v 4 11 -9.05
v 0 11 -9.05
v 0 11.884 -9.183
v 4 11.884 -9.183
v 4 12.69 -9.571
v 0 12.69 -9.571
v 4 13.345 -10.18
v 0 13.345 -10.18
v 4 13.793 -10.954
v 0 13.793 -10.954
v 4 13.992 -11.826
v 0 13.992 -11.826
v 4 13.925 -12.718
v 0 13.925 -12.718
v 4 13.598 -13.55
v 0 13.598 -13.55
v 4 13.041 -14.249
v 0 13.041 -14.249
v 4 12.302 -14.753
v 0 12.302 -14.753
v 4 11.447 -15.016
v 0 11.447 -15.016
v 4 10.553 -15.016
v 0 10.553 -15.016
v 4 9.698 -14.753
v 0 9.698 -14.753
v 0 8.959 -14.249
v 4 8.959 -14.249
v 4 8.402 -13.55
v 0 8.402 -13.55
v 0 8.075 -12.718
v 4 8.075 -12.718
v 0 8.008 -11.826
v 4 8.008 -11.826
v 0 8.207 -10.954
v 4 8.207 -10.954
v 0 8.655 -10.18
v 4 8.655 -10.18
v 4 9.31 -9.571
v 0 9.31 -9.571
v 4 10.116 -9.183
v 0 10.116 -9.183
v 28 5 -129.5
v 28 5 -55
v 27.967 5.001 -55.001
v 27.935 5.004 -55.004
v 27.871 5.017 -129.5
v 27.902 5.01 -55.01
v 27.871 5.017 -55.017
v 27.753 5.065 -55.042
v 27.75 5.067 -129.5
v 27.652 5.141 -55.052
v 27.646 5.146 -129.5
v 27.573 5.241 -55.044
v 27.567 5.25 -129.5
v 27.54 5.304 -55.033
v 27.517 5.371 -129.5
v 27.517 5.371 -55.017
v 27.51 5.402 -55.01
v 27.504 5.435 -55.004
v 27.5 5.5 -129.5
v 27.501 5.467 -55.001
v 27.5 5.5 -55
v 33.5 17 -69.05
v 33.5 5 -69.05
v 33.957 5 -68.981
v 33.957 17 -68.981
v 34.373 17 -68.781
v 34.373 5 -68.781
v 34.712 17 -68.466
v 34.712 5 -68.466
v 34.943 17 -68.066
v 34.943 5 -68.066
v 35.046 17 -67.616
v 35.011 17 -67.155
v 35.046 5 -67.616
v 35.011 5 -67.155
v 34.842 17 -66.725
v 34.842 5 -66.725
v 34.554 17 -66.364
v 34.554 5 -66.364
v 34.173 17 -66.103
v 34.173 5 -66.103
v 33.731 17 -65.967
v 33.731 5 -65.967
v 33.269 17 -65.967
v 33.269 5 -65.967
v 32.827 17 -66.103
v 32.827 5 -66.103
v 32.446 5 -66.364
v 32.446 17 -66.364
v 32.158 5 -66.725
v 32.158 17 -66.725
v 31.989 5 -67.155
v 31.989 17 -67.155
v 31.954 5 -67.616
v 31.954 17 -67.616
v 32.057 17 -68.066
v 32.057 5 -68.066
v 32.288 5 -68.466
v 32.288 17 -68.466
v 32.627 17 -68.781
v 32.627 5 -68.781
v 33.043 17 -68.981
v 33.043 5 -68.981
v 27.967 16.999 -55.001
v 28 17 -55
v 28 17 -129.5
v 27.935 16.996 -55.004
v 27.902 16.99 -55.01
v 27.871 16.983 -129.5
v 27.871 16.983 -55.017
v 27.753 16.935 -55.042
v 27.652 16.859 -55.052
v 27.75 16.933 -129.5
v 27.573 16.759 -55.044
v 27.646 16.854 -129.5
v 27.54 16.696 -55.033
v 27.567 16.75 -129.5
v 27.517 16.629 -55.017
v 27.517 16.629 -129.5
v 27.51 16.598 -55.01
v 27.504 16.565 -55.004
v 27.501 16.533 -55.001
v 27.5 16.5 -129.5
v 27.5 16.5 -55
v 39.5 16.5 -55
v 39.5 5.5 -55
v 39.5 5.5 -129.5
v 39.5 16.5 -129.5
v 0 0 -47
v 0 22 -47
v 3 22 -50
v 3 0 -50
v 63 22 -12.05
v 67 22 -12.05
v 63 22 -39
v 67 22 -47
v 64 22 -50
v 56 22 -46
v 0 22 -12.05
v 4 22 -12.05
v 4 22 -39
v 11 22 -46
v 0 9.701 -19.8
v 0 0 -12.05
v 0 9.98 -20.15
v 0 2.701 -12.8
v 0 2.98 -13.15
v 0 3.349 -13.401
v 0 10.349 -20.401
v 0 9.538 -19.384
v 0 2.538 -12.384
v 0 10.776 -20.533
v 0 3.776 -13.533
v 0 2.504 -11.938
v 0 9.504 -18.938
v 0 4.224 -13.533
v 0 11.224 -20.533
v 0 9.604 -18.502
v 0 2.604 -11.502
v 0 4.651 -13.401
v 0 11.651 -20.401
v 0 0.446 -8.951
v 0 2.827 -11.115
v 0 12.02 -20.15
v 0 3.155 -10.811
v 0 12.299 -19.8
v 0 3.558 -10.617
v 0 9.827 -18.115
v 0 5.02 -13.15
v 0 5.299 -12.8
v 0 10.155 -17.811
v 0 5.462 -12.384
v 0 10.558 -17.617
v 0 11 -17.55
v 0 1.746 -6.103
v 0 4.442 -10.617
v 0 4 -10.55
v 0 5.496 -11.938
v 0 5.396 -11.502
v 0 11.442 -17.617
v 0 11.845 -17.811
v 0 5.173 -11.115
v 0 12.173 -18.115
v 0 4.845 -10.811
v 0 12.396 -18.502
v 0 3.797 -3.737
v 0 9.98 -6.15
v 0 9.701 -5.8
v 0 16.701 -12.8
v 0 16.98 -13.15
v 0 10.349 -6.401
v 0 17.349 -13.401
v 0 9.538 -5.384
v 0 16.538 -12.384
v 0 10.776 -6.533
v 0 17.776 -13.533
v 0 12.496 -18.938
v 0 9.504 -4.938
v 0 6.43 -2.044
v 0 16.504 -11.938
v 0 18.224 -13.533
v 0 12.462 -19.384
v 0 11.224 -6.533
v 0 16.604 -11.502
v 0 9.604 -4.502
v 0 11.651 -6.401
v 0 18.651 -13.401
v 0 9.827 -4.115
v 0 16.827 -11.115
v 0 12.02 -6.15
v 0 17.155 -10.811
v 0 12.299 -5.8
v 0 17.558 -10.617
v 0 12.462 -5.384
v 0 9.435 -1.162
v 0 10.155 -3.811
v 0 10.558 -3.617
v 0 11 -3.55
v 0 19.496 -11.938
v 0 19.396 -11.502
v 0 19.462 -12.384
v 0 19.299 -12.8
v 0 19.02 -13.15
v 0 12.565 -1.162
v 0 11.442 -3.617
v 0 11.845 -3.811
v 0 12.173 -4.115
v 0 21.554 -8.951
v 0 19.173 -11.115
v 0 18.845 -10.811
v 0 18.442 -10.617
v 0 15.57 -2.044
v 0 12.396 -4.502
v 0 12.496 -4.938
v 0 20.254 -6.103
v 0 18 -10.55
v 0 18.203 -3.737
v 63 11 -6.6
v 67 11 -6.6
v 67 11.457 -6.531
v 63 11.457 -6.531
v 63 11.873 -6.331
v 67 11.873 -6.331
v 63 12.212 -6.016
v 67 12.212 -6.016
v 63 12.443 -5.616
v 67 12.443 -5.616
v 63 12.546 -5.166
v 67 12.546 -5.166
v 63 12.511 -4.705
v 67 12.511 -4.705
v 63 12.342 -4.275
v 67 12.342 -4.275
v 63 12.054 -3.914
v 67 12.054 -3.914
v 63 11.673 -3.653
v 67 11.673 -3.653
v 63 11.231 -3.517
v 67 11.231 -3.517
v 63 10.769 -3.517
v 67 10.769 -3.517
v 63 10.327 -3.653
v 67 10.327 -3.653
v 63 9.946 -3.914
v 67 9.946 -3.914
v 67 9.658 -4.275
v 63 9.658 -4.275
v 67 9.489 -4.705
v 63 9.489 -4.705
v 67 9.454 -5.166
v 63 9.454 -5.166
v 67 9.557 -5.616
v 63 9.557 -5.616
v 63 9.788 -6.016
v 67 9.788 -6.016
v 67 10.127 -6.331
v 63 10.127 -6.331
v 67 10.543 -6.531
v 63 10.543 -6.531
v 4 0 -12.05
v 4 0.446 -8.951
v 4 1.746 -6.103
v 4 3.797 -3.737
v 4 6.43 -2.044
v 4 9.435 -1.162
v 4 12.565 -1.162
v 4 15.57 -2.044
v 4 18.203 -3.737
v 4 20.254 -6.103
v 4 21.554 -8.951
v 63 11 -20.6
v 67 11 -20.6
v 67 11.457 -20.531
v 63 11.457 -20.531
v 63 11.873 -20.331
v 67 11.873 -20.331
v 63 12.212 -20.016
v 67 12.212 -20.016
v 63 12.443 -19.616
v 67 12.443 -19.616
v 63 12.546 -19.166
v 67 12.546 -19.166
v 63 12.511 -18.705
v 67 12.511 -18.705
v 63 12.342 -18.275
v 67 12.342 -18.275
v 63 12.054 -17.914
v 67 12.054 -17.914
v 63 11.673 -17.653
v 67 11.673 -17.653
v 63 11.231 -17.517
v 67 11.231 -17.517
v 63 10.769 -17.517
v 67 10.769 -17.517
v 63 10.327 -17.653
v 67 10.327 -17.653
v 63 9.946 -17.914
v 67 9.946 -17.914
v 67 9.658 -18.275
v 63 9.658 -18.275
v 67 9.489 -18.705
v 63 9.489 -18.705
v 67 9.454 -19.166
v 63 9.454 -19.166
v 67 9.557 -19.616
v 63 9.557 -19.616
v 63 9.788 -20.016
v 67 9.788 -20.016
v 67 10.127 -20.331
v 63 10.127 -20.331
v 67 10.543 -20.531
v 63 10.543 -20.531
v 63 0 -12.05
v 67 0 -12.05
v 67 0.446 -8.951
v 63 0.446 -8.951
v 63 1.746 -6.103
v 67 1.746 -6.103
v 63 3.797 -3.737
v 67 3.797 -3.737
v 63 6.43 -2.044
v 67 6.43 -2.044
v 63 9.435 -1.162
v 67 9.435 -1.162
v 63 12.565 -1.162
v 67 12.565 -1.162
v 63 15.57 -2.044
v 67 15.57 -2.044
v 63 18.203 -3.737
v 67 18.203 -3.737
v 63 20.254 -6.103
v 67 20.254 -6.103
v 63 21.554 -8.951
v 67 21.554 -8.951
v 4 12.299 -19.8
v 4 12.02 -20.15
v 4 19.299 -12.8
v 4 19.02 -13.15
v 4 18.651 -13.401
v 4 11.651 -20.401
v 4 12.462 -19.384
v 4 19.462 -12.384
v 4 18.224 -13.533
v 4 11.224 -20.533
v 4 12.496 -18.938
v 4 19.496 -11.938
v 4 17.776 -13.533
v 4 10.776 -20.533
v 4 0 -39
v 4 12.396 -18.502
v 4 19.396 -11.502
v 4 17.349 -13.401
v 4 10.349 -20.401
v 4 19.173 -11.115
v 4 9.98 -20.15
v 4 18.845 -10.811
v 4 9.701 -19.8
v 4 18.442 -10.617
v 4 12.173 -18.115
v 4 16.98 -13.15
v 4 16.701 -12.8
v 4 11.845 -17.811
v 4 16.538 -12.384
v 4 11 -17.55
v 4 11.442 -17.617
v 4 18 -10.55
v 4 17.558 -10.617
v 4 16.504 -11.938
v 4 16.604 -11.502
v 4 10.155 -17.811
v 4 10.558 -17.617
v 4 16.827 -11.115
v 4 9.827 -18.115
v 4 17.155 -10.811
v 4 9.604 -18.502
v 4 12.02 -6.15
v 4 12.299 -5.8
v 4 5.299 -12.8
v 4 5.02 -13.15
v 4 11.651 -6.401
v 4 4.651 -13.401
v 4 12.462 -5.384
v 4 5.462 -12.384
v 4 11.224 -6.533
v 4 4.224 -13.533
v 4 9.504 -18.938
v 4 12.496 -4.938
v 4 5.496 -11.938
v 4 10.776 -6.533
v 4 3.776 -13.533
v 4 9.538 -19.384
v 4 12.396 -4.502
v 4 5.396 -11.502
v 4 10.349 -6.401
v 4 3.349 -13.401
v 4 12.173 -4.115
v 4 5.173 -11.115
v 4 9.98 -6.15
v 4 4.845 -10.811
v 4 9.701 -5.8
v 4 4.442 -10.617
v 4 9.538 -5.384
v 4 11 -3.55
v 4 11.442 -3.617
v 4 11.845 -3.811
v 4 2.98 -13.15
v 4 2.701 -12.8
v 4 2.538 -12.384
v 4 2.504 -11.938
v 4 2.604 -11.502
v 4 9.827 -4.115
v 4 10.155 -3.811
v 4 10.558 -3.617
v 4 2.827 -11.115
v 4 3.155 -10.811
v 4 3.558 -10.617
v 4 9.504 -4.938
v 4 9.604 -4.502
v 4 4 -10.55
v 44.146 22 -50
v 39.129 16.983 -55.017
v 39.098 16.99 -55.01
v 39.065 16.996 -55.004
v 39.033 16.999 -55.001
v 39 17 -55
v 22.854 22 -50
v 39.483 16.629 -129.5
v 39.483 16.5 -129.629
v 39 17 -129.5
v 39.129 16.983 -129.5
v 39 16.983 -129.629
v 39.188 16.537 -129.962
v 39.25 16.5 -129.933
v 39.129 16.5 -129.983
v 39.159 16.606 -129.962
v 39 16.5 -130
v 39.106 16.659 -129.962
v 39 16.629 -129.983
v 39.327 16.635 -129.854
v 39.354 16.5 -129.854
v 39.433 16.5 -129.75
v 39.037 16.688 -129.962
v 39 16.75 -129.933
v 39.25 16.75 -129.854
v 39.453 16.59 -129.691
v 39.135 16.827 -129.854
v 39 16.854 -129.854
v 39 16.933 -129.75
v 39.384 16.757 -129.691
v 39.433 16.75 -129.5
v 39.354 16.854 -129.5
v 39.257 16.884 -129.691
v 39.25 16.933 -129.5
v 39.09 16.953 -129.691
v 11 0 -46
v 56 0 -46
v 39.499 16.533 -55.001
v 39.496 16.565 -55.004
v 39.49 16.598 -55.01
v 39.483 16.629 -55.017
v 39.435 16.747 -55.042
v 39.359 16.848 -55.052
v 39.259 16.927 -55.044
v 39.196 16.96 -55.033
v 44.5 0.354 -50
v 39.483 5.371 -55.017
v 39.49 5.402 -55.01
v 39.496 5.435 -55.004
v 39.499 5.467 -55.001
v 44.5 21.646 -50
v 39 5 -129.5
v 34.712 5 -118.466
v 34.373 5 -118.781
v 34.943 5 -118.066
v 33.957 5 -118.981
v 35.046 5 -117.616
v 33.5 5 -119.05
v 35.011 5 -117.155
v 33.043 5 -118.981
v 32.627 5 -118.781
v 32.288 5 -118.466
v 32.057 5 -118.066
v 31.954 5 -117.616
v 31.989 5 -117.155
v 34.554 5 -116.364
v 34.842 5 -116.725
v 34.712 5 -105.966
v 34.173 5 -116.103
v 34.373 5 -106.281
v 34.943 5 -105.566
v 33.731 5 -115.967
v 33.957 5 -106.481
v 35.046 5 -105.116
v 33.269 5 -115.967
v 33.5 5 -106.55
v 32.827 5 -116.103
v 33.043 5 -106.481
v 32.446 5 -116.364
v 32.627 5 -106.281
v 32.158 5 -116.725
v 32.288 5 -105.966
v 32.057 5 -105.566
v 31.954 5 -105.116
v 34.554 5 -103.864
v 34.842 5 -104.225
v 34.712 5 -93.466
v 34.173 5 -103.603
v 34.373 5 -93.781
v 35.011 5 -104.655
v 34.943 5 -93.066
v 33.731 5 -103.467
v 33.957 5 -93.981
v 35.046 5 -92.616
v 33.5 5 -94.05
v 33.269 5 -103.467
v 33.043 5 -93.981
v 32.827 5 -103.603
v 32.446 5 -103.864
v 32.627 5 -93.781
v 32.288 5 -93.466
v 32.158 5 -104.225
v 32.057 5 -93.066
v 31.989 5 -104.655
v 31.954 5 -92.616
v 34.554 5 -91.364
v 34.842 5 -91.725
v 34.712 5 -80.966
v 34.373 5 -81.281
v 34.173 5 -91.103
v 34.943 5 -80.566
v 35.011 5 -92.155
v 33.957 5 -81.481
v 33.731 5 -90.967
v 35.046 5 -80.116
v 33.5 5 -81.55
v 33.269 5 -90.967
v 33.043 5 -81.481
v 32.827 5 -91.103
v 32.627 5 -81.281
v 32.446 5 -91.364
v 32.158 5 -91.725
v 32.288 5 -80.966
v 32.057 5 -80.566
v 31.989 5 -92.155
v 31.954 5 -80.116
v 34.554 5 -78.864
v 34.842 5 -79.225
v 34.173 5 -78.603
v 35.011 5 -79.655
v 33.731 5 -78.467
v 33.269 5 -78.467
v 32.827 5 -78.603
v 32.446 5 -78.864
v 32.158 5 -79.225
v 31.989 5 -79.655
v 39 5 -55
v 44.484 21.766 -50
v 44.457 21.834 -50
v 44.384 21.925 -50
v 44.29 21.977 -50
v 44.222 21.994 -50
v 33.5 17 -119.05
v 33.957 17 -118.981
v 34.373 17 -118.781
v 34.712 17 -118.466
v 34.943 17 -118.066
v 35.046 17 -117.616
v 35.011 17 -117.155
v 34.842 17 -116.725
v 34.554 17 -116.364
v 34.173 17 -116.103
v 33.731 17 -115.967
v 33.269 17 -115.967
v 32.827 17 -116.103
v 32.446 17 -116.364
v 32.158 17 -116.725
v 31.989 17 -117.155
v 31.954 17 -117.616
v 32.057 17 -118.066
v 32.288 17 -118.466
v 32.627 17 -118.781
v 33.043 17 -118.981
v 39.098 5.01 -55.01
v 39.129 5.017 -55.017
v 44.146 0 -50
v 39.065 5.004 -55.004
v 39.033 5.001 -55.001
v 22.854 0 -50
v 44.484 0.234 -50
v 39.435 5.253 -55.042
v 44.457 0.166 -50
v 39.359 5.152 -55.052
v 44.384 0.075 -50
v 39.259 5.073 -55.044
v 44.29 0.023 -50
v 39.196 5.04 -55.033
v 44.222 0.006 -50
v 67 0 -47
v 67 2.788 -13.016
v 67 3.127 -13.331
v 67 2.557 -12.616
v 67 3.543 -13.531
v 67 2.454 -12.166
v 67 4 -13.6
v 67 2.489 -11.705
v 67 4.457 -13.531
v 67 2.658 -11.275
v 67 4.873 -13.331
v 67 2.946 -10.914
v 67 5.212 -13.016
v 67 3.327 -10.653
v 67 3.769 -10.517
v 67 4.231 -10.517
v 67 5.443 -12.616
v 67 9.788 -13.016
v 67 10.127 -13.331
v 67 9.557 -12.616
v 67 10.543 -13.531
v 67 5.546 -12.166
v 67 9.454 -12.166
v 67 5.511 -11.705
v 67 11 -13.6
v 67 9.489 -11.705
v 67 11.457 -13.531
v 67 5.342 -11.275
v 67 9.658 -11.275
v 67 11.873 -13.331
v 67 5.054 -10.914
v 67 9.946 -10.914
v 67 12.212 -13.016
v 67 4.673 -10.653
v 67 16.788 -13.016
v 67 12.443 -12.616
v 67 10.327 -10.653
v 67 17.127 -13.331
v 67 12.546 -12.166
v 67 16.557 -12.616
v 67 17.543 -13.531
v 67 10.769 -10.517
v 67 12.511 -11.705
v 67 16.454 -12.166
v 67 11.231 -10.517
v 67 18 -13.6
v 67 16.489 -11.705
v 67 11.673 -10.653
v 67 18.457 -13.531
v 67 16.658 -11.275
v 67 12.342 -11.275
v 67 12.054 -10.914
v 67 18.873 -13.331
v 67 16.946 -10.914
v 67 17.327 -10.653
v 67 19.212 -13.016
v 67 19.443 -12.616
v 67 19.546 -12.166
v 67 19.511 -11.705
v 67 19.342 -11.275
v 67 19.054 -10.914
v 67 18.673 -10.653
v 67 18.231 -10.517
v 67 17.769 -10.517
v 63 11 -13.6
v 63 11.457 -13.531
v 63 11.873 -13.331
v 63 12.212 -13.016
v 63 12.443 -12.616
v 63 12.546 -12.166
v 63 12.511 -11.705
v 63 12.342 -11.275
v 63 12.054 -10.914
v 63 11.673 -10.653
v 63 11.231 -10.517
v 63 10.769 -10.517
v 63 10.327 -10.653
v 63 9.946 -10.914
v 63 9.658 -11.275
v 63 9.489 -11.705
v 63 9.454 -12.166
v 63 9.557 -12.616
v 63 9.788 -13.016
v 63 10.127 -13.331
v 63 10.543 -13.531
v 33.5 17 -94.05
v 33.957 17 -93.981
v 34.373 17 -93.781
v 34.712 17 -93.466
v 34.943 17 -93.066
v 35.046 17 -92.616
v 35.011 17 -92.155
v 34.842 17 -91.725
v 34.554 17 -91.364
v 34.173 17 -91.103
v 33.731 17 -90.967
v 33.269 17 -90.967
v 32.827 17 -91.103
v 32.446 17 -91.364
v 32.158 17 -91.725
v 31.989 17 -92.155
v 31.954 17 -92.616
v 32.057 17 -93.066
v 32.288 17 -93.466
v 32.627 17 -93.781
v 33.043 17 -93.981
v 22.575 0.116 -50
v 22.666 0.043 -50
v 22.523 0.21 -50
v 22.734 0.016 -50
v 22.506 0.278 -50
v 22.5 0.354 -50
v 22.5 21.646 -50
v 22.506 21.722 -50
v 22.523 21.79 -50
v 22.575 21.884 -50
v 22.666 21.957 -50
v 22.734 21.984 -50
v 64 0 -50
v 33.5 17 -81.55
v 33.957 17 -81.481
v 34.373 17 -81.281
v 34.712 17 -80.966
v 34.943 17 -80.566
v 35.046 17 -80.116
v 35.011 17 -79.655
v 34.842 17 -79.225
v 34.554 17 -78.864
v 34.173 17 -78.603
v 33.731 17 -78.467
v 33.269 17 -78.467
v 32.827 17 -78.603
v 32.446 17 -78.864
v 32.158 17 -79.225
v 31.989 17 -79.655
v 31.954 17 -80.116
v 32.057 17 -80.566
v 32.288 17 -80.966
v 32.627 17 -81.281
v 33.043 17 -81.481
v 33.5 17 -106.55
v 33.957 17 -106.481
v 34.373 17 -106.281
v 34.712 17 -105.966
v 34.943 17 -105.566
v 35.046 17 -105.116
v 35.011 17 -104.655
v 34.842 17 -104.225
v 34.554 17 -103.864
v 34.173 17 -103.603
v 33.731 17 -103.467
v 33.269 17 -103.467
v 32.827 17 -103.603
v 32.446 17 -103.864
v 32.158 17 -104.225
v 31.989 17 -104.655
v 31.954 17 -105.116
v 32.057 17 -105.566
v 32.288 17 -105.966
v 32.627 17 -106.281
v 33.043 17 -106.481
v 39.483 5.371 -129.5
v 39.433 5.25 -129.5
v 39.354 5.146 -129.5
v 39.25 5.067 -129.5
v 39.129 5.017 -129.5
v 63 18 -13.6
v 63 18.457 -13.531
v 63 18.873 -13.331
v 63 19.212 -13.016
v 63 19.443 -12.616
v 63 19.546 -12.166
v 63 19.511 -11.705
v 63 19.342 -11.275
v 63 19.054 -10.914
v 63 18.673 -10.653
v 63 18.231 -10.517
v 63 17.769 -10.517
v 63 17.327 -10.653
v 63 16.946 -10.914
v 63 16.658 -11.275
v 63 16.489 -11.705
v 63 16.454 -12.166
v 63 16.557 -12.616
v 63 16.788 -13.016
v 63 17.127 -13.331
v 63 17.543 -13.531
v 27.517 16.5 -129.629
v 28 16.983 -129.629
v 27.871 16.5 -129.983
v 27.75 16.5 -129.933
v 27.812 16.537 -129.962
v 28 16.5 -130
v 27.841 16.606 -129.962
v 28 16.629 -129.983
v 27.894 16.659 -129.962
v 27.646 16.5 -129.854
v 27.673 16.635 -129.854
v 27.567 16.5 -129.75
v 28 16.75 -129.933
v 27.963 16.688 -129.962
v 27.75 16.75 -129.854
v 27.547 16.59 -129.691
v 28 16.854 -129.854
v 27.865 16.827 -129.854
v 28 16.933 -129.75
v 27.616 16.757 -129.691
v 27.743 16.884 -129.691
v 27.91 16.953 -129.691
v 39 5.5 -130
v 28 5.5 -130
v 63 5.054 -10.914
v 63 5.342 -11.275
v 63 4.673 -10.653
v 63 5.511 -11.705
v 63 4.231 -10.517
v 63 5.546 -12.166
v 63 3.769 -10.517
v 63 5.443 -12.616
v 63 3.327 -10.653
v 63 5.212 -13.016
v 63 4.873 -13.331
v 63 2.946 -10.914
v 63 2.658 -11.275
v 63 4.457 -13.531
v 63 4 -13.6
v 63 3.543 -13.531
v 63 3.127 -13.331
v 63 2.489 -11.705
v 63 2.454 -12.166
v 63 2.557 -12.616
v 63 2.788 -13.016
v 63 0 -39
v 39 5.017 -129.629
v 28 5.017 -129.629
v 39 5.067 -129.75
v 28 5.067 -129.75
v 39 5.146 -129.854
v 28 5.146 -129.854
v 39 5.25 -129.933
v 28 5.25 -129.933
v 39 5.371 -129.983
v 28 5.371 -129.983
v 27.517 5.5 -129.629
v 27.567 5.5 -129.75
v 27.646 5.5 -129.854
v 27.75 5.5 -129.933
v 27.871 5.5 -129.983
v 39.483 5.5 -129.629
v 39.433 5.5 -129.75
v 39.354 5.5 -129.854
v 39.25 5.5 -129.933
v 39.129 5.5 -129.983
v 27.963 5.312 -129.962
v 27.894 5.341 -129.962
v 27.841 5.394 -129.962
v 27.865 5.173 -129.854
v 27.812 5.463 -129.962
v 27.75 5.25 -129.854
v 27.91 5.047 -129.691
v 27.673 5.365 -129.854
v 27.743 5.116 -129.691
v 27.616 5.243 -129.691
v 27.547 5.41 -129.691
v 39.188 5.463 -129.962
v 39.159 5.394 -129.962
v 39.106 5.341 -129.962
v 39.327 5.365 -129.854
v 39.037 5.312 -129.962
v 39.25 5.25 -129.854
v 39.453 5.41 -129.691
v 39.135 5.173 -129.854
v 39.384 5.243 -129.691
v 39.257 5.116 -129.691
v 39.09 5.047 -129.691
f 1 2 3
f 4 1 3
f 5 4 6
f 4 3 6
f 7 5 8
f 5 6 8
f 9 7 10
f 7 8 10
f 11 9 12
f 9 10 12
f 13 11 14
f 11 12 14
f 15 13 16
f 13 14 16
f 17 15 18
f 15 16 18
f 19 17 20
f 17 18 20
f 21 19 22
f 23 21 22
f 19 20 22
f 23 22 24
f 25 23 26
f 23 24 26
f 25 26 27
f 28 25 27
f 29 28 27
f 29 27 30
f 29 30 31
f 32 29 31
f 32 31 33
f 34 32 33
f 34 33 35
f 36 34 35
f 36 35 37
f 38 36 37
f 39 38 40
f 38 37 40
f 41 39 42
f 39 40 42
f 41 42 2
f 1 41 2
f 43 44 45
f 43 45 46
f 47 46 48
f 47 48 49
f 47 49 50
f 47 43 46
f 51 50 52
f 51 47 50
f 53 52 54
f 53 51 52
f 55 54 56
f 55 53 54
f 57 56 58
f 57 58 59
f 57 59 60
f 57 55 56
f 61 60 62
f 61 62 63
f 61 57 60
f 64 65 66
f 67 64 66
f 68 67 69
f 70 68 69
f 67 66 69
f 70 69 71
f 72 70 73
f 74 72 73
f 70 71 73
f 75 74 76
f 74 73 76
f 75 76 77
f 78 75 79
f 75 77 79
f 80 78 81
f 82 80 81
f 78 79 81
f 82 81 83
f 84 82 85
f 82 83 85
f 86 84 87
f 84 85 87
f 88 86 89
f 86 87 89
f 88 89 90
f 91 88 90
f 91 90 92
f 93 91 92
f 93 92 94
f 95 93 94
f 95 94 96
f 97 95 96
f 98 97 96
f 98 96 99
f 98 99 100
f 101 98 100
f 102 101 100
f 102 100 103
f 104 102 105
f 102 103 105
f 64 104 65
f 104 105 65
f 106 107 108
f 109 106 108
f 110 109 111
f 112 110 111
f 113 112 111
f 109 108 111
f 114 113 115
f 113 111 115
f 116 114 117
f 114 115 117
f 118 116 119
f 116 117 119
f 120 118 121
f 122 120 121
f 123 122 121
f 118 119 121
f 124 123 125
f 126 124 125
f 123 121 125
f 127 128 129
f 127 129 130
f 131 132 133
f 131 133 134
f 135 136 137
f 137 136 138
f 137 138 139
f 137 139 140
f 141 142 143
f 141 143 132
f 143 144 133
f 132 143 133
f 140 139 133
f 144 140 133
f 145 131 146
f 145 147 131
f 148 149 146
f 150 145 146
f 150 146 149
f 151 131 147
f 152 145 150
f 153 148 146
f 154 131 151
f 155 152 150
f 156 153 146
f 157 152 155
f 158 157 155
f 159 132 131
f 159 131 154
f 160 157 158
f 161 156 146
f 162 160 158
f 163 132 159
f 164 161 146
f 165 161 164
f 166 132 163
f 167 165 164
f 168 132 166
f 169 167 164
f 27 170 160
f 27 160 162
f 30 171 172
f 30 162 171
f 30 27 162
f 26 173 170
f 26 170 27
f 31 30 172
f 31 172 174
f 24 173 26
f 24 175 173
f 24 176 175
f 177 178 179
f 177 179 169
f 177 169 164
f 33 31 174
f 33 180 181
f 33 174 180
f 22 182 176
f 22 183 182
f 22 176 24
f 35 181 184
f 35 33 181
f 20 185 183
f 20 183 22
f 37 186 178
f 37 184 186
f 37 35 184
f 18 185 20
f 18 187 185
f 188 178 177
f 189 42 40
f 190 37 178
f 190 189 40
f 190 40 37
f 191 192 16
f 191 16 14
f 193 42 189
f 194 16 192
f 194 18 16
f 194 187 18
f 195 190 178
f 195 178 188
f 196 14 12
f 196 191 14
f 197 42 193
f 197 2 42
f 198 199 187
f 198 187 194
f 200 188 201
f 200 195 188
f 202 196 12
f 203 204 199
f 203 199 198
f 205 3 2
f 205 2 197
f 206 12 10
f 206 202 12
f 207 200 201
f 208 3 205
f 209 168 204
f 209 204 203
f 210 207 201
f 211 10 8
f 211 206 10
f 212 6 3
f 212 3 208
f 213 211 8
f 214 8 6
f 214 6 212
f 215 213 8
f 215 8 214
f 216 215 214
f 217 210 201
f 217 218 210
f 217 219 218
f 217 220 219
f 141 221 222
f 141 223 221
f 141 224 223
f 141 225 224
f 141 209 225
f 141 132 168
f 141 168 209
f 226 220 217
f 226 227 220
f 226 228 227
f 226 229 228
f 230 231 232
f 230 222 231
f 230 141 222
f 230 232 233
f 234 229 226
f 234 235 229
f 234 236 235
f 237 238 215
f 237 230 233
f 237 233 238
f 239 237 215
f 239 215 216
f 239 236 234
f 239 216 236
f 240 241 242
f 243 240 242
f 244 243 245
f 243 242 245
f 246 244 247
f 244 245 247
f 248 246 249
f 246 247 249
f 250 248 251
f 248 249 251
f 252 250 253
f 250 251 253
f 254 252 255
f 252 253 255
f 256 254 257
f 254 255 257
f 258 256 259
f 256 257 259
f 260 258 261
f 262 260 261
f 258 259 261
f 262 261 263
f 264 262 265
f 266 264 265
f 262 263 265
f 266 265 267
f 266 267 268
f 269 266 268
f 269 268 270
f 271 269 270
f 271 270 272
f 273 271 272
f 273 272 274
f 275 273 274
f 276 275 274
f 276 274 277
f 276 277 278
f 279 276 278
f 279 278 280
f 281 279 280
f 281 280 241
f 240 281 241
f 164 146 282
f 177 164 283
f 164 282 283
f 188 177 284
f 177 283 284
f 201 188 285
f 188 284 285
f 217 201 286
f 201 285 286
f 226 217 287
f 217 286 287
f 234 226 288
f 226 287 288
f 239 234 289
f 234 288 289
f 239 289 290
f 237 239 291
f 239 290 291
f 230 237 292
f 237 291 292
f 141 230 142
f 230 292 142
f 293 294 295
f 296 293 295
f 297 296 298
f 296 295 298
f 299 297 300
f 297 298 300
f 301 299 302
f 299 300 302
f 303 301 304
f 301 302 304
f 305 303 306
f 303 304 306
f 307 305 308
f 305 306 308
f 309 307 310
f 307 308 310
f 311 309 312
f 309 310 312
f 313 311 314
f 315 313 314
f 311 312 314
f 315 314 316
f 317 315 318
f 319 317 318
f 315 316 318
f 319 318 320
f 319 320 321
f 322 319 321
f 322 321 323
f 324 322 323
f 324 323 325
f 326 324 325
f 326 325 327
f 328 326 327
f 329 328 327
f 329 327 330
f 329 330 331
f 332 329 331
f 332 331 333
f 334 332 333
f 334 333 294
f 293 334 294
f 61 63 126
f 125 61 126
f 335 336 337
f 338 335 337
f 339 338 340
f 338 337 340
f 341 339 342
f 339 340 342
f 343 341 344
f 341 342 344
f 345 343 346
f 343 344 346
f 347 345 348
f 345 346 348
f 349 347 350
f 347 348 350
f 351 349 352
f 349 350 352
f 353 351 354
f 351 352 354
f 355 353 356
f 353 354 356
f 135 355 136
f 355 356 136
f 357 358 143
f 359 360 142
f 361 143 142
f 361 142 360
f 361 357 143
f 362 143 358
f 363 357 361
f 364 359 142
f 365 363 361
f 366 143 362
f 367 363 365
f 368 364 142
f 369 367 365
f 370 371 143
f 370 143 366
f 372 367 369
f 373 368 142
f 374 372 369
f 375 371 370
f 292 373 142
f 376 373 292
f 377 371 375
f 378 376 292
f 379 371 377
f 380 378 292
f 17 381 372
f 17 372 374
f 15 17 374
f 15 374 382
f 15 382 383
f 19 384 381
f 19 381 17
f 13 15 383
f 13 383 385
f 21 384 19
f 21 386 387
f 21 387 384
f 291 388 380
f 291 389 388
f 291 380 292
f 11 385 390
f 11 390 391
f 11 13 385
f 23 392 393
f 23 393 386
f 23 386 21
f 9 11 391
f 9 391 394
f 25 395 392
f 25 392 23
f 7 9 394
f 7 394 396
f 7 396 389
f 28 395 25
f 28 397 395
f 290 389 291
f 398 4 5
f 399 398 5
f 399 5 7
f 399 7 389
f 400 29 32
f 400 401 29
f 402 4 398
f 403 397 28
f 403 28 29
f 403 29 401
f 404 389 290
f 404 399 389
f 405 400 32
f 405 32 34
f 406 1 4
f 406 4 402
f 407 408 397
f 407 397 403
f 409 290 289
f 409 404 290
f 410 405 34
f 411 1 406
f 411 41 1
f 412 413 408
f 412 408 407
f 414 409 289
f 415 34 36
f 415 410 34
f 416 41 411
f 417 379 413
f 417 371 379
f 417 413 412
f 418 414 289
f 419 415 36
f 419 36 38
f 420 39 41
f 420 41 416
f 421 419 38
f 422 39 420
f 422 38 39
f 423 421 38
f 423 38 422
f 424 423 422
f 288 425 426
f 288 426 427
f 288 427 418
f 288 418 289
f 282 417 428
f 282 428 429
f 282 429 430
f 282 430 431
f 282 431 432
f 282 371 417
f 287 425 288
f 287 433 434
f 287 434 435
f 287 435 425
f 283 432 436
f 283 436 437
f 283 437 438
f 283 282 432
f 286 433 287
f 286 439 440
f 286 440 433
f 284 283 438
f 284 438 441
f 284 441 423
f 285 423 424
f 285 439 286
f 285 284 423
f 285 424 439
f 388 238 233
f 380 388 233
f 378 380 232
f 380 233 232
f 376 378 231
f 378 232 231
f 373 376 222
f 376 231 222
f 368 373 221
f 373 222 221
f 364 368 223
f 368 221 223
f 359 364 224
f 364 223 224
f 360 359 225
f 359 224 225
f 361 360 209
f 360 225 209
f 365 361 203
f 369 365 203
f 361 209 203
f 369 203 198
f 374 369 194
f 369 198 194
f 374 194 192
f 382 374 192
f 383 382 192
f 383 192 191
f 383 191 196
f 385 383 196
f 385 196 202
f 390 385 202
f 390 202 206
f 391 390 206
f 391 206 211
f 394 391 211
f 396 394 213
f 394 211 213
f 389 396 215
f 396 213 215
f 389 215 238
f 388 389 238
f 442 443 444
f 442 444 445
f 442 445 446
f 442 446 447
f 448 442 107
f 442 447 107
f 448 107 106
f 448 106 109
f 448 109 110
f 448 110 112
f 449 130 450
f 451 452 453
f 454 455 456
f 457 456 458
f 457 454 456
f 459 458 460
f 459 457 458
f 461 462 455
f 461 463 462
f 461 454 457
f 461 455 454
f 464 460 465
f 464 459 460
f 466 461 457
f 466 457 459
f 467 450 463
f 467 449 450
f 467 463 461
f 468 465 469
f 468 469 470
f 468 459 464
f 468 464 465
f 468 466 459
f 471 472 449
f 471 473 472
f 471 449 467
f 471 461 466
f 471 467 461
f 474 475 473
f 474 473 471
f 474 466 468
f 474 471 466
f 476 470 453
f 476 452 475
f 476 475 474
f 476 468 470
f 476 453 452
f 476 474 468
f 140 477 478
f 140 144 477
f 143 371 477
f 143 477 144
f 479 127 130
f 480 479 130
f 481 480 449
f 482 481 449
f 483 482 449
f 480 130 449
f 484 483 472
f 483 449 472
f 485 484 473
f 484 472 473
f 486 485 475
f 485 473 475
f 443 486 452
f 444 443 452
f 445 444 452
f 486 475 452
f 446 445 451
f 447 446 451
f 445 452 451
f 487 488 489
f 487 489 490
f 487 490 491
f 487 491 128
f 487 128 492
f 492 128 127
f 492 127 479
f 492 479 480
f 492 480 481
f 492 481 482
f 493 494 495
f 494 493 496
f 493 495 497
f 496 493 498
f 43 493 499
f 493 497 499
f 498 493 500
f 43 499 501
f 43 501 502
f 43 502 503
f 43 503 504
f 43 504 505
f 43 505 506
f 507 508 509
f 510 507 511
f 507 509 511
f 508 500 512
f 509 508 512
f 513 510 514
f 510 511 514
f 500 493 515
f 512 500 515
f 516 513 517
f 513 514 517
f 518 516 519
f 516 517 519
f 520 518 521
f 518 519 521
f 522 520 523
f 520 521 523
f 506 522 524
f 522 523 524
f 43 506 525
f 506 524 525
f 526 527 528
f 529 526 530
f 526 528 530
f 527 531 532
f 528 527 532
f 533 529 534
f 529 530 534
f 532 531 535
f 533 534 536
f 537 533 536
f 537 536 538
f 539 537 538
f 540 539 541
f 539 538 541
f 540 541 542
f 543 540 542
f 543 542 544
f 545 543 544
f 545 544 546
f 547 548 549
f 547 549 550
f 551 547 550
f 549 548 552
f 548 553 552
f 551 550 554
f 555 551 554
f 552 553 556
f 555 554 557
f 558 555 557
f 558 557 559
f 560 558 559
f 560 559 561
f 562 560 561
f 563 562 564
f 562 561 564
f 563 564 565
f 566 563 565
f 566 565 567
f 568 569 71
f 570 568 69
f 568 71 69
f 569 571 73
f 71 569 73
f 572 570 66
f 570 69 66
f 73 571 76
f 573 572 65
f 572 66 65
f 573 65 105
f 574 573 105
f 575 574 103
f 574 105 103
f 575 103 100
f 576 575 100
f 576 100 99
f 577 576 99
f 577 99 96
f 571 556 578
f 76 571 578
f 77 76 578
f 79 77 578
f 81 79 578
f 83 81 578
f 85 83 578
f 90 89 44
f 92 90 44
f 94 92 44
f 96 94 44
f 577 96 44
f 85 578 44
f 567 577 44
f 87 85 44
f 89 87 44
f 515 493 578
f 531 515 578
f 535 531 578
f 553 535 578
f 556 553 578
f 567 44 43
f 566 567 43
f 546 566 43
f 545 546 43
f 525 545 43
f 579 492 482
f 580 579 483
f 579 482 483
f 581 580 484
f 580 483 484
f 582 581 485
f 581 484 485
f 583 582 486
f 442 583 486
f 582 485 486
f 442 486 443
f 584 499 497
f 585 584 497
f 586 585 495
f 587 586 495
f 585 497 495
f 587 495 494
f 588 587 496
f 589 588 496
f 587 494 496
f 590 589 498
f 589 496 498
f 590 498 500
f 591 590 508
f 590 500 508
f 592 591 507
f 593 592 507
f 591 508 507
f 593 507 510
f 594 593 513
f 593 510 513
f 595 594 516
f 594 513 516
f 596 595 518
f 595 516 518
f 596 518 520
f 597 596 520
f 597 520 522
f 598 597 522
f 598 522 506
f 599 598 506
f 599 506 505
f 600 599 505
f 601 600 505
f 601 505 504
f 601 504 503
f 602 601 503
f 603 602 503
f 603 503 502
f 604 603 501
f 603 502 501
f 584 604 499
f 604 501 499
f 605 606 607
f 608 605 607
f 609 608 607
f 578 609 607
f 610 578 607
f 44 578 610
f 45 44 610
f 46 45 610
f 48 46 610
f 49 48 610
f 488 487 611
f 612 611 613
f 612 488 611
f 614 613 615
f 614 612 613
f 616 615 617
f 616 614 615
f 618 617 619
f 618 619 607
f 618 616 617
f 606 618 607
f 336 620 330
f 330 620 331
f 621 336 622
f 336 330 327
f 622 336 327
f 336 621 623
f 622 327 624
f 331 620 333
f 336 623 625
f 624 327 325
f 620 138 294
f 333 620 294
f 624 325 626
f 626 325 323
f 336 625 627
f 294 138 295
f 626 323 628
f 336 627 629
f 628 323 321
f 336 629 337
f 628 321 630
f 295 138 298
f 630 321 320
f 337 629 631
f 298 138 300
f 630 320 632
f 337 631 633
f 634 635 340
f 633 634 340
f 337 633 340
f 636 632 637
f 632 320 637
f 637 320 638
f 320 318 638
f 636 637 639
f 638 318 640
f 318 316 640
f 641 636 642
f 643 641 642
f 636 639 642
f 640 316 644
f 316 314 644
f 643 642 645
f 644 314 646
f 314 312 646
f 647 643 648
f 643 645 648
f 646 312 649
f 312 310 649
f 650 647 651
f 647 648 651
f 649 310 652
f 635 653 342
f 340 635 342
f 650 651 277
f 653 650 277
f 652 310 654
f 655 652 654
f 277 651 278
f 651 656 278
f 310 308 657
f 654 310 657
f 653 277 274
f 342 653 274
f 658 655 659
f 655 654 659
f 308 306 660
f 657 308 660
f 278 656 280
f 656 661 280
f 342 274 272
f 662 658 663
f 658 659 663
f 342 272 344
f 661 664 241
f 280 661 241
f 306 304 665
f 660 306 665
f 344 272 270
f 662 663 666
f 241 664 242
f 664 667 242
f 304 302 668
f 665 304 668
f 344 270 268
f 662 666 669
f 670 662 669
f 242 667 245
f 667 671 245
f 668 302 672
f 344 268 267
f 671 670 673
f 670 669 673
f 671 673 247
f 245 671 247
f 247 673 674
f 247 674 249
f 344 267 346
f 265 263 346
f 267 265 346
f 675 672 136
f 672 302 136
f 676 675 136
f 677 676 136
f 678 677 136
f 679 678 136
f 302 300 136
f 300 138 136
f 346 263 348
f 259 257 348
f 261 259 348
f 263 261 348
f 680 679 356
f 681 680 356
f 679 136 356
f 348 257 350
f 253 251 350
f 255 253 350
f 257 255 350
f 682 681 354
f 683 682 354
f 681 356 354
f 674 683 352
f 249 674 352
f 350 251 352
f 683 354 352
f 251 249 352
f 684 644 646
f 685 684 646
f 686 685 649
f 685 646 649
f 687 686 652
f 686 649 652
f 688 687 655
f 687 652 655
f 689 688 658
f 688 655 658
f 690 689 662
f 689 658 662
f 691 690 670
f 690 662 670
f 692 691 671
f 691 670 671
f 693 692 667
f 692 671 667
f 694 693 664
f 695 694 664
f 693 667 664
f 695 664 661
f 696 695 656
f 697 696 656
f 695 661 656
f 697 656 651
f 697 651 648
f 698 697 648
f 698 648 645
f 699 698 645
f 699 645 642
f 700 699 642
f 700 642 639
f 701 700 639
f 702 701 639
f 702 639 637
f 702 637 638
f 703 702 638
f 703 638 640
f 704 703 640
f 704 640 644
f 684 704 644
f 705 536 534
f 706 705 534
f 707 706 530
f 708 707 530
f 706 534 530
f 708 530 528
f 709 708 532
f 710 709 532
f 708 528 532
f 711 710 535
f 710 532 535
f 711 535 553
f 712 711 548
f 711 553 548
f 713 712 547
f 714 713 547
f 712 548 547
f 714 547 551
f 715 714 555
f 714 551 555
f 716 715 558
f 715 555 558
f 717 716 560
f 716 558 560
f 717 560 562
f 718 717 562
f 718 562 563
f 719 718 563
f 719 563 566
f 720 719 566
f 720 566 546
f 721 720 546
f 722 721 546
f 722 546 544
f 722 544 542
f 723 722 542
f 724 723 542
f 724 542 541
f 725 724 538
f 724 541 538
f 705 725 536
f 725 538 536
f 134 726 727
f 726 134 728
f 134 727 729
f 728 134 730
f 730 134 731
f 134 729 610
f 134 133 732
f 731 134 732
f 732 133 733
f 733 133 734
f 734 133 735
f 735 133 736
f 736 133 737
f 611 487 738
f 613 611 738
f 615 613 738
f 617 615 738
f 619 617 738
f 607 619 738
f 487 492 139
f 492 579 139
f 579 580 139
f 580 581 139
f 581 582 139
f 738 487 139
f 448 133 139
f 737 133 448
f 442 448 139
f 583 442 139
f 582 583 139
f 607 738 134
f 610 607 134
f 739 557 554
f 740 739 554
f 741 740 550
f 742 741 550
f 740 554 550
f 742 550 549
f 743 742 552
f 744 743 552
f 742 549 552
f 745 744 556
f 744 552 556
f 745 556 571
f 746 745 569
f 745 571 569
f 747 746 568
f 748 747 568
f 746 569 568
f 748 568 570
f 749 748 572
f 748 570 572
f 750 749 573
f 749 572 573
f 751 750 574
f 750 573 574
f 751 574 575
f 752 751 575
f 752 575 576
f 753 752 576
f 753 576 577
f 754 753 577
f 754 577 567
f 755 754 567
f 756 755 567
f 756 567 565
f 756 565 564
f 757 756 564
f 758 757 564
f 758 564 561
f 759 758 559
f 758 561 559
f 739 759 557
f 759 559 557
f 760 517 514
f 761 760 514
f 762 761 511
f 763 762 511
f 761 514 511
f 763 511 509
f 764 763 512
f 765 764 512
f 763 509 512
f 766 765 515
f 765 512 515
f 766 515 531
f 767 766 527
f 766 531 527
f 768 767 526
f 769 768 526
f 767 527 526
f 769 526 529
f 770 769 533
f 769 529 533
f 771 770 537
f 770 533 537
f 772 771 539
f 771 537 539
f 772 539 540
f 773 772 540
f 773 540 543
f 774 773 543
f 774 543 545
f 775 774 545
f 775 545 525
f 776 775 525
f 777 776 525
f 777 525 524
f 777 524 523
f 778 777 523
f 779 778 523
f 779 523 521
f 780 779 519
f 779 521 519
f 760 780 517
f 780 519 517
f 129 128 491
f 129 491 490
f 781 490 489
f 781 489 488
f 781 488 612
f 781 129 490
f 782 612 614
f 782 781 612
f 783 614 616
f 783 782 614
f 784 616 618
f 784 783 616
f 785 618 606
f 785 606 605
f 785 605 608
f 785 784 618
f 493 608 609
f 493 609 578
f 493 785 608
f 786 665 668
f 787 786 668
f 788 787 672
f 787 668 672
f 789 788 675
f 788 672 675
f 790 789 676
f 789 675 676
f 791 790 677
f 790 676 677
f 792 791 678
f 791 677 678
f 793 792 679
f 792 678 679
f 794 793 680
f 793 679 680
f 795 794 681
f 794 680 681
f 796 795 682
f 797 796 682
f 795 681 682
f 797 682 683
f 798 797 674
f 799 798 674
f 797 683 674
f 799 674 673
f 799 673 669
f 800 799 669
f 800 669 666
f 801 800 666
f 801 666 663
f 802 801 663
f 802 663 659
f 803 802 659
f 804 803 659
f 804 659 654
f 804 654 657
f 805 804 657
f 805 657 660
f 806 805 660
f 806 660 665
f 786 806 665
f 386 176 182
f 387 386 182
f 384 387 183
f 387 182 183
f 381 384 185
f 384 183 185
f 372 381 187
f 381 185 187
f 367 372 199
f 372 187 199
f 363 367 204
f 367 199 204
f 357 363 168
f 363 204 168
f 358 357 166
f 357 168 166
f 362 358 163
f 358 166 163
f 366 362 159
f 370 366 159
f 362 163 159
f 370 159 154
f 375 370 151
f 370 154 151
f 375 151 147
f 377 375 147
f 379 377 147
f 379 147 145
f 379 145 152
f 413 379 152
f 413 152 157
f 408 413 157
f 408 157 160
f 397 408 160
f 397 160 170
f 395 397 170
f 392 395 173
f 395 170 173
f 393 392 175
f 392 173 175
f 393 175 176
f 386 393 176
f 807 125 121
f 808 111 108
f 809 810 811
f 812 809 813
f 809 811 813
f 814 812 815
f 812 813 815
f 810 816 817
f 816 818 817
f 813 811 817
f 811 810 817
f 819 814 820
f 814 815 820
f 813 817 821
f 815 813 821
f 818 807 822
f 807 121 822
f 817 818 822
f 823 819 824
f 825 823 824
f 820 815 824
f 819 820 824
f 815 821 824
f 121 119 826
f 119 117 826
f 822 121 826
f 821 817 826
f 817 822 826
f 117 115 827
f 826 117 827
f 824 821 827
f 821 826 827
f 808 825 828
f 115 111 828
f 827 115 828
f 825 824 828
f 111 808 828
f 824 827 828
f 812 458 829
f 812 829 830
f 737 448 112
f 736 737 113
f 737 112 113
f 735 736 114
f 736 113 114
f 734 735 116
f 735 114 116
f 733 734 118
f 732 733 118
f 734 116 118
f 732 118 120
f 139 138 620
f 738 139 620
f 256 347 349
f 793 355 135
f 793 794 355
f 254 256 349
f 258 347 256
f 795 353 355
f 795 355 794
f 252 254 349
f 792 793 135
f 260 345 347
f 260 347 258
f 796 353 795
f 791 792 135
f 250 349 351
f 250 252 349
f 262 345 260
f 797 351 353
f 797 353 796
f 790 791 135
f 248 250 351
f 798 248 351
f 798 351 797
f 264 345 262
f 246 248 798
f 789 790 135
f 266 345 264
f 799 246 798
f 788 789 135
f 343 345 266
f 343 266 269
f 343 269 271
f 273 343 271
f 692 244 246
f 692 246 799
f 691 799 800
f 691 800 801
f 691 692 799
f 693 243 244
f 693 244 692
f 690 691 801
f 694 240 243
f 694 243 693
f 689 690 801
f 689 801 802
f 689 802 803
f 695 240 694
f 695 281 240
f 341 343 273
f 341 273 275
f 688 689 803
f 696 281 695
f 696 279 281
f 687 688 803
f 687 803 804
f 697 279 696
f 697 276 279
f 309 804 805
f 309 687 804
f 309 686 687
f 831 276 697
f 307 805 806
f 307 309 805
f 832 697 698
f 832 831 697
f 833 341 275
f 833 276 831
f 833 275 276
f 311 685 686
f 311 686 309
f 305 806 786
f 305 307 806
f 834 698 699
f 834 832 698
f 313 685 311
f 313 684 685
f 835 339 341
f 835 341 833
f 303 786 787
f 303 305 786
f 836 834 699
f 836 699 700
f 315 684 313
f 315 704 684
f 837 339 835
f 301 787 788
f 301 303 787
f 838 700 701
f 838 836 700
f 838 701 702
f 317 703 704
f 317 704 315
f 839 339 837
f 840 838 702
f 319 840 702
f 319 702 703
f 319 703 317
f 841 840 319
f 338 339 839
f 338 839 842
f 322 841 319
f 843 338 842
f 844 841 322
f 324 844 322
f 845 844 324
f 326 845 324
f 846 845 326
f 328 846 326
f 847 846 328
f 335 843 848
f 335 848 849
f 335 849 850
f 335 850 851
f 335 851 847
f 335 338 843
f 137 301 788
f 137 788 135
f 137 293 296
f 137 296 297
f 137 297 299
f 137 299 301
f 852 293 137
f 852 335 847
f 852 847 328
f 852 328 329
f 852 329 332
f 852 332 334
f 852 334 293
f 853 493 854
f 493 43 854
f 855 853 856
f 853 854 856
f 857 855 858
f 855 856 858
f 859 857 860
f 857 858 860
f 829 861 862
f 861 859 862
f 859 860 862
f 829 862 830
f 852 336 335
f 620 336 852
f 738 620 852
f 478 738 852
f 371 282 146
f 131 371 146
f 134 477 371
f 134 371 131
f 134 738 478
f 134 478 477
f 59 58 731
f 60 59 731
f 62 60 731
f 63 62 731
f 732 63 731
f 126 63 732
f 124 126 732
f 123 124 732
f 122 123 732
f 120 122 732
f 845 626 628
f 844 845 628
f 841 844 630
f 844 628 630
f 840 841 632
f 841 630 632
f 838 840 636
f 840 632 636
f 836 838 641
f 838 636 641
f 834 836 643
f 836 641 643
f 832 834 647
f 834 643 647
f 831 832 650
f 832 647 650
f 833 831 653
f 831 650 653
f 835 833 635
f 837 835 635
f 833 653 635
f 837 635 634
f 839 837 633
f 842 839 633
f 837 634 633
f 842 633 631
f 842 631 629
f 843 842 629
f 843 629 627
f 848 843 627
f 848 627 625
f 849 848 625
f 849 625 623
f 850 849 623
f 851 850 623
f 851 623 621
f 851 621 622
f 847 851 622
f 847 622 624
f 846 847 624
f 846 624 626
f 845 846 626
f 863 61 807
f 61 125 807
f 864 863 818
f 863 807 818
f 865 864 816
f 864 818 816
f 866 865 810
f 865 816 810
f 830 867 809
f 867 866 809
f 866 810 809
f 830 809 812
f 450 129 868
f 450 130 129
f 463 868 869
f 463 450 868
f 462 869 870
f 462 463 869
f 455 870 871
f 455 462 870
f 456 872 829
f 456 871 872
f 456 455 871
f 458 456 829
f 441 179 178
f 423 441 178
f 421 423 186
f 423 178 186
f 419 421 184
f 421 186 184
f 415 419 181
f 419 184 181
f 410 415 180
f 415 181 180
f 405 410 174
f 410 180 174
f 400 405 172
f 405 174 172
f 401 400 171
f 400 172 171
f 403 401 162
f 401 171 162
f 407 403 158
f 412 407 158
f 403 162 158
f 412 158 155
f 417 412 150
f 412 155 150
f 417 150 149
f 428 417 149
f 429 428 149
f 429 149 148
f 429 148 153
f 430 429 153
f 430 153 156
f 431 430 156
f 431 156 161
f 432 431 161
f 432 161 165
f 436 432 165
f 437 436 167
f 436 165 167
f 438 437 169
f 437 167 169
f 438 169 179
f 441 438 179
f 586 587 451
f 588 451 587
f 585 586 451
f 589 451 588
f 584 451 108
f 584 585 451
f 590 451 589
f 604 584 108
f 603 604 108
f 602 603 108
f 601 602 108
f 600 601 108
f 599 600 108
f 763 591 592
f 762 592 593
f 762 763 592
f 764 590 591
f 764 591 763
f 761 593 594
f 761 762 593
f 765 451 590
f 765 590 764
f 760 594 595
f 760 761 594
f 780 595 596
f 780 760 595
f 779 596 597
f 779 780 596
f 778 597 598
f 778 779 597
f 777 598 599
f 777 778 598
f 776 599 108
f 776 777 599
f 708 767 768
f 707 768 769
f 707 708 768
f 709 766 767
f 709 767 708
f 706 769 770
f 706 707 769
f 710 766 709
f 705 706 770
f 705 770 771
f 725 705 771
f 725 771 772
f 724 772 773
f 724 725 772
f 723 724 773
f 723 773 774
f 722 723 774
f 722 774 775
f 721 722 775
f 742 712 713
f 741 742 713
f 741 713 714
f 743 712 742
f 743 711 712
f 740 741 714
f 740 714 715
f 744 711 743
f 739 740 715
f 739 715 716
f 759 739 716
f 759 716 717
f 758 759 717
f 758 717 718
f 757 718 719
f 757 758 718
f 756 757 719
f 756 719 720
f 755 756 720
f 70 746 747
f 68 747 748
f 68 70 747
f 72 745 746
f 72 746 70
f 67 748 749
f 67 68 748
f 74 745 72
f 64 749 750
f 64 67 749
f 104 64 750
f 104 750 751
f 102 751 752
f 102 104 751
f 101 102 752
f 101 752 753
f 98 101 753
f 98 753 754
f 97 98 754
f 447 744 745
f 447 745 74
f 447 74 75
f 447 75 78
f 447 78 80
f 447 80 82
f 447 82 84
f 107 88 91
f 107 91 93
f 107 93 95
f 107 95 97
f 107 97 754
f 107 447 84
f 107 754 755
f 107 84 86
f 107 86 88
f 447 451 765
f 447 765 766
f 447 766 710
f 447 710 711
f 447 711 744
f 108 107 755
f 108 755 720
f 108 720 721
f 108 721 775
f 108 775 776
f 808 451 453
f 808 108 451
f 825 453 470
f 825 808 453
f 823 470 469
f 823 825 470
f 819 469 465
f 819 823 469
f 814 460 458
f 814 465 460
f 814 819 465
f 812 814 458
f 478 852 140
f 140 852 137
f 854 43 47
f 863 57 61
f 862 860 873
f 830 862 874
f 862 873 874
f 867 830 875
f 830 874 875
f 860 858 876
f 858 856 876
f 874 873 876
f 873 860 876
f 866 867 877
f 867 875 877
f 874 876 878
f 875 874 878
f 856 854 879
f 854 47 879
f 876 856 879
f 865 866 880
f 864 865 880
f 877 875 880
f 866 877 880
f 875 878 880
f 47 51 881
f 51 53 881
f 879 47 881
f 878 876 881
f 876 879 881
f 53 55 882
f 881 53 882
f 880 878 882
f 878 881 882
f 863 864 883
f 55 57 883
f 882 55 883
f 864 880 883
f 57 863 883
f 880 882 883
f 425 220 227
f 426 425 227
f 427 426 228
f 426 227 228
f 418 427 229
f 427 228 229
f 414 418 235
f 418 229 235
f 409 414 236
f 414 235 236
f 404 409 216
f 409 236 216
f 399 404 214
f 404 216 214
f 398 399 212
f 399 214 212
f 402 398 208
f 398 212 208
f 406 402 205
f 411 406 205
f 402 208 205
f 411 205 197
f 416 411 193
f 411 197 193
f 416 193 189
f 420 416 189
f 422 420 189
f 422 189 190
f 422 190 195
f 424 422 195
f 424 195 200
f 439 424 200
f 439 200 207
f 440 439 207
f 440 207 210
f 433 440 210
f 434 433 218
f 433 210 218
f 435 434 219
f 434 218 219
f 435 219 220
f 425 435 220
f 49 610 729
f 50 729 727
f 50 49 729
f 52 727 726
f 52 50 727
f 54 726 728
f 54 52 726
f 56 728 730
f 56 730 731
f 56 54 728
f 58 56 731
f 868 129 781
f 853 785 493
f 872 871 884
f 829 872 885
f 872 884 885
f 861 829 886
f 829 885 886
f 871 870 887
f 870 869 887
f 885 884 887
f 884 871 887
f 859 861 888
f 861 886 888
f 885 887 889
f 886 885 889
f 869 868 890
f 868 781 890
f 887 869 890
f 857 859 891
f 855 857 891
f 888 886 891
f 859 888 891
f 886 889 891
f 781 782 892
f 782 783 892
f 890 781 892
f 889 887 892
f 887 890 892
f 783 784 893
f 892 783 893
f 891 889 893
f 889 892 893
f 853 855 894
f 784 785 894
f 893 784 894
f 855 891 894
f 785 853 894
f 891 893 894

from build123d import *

# Parameters (mm, degrees)
BOSS_EXTRUDE1_DEPTH      = 22
SKETCH3_R                = 1.55
CUT_EXTRUDE1_DEPTH       = 30
CUT_EXTRUDE5_DEPTH       = 9
SKETCH11_R               = 1.55
CUT_EXTRUDE10_DEPTH      = 13
CUT_EXTRUDE11_START      = -10
CUT_EXTRUDE11_DEPTH      = 10
SKETCH13_R               = 3
SKETCH13_R_2             = 1.5
CUT_EXTRUDE12_DEPTH      = 4
SKETCH14_W               = 54
SKETCH14_H               = 9.3
SKETCH14_W_2             = 7.05
SKETCH14_H_2             = 4
BOSS_EXTRUDE4_DEPTH      = 4
SKETCH17_W               = 7.05
SKETCH17_H               = 4
BOSS_EXTRUDE5_DEPTH      = 23.05
BOSS_EXTRUDE6_DEPTH      = 27.3
BOSS_EXTRUDE6_DEPTH_BACK = 4
SKETCH18_W               = 54
SKETCH18_H               = 2.95
SKETCH19_W               = 54
SKETCH19_H               = 2.8
BOSS_EXTRUDE7_DEPTH      = 21
FILLET2_SIZE             = 6.5
FILLET3_SIZE             = 0.5
SKETCH20_R               = 3.970030919
BOSS_EXTRUDE8_DEPTH      = 6
FILLET4_R                = 1
CUT_EXTRUDE13_START      = -37.3
CUT_EXTRUDE13_DEPTH      = 37.3
SKETCH22_W               = 56.118071471
SKETCH22_H               = 11.813110758
CUT_EXTRUDE14_DEPTH      = 56
SKETCH23_W               = 67
SKETCH23_H               = 4
BOSS_EXTRUDE9_DEPTH      = 4
SKETCH24_W               = 67
SKETCH24_H               = 4
BOSS_EXTRUDE10_DEPTH     = 4
SKETCH25_W               = 12
SKETCH25_H               = 12
BOSS_EXTRUDE11_DEPTH     = 80
FILLET6_SIZE             = 7
SKETCH27_W               = 67
SKETCH27_H               = 4
CUT_EXTRUDE16_DEPTH      = 80
FILLET7_SIZE             = 5
SKETCH29_R               = 1.55
CUT_EXTRUDE17_DEPTH      = 12
FILLET8_R                = 0.5
FILLET9_R                = 0.5
FILLET10_SIZE            = 3


# Read off the part's stored shape, not the designer's step: Cut-Extrude13
with BuildPart() as part:
    # Sketch1 → Boss-Extrude1 (new body)
    with BuildSketch(Plane(origin=(0, 0, 0), x_dir=(1, 0, 0), z_dir=(0, 1, 0))):
        Polygon((0, 0), (0, 50), (67, 50), (67, 0), (63, 0), (63, 46), (4, 46), (4, 0), align=None)
    extrude(amount=BOSS_EXTRUDE1_DEPTH)

    # Sketch3 → Cut-Extrude1 (cut)
    with BuildSketch(Plane(origin=(67, 0, 0), x_dir=(0, 0, -1), z_dir=(1, 0, 0))):
        with Locations((12.05, 11)):
            Circle(SKETCH3_R)
    extrude(amount=-CUT_EXTRUDE1_DEPTH, mode=Mode.SUBTRACT)

    # Sketch5 → Cut-Extrude5 (cut)
    with BuildSketch(Plane(origin=(67, 0, 0), x_dir=(0, 0, -1), z_dir=(1, 0, 0))):
        with BuildLine():
            Line((12.05, 22), (0, 22))
            Line((0, 22), (0, 0))
            Line((0, 0), (12.05, 0))
            ThreePointArc((12.05, 0), (1.05, 11), (12.05, 22))
        make_face()
    extrude(amount=-CUT_EXTRUDE5_DEPTH, mode=Mode.SUBTRACT)

    # Sketch11 → Cut-Extrude10 (cut)
    with BuildSketch(Plane(origin=(67, 0, 0), x_dir=(0, 0, -1), z_dir=(1, 0, 0))):
        with Locations((19.05, 11)):
            Circle(SKETCH11_R)
        with Locations((12.05, 18)):
            Circle(SKETCH11_R)
        with Locations((12.05, 4)):
            Circle(SKETCH11_R)
        with Locations((5.05, 11)):
            Circle(SKETCH11_R)
    extrude(amount=-CUT_EXTRUDE10_DEPTH, mode=Mode.SUBTRACT)

    # Sketch12 → Cut-Extrude11 (cut)
    with BuildSketch(Plane.ZY.offset(CUT_EXTRUDE11_START)):
        with BuildLine():
            Line((-12.05, 22), (0, 22))
            Line((0, 22), (0, 0))
            Line((0, 0), (-12.05, 0))
            ThreePointArc((-12.05, 0), (-1.05, 11), (-12.05, 22))
        make_face()
    extrude(amount=CUT_EXTRUDE11_DEPTH, mode=Mode.SUBTRACT)

    # Sketch13 → Cut-Extrude12 (cut)
    with BuildSketch(Plane.ZY):
        with Locations((-12.05, 11)):
            Circle(SKETCH13_R)
        with Locations((-19.05, 11)):
            Circle(SKETCH13_R_2)
        with Locations((-12.05, 4)):
            Circle(SKETCH13_R_2)
        with Locations((-5.05, 11)):
            Circle(SKETCH13_R_2)
        with Locations((-12.05, 18)):
            Circle(SKETCH13_R_2)
    extrude(amount=-CUT_EXTRUDE12_DEPTH, mode=Mode.SUBTRACT)

    # Sketch14 → Boss-Extrude4 (add)
    with BuildSketch(Plane(origin=(0, 0, -50), x_dir=(-1, 0, 0), z_dir=(0, 0, -1))):
        with Locations((-33.5, -4.65)):
            Rectangle(SKETCH14_W, SKETCH14_H)
        with Locations((-56.975, 20)):
            Rectangle(SKETCH14_W_2, SKETCH14_H_2)
        with Locations((-10.025, 20)):
            Rectangle(SKETCH14_W_2, SKETCH14_H_2)
    extrude(amount=-BOSS_EXTRUDE4_DEPTH)

    # Sketch17 → Boss-Extrude5 (add)
    with BuildSketch(Plane(origin=(0, 0, -50), x_dir=(-1, 0, 0), z_dir=(0, 0, -1))):
        with Locations((-56.975, 20)):
            Rectangle(SKETCH17_W, SKETCH17_H)
        with Locations((-10.025, 20)):
            Rectangle(SKETCH17_W, SKETCH17_H)
    extrude(amount=BOSS_EXTRUDE5_DEPTH)

    # Sketch18 → Boss-Extrude6 (add, two sides: drawn at the far end of the back side and taken through both)
    with BuildSketch(Plane.XZ.offset(-18).offset(-BOSS_EXTRUDE6_DEPTH_BACK)):
        with Locations((33.5, -71.575)):
            Rectangle(SKETCH18_W, SKETCH18_H)
    extrude(amount=BOSS_EXTRUDE6_DEPTH + BOSS_EXTRUDE6_DEPTH_BACK)

    # Sketch19 → Boss-Extrude7 (add)
    with BuildSketch(Plane(origin=(0, 0, -50), x_dir=(-1, 0, 0), z_dir=(0, 0, -1))):
        with Locations((-33.5, -7.9)):
            Rectangle(SKETCH19_W, SKETCH19_H)
    extrude(amount=BOSS_EXTRUDE7_DEPTH)

    # Fillet2
    fillet2_edges = [part.edges().sort_by_distance(p)[0] for p in [
        (60.5, 20, -50),
        (6.5, 20, -50),
    ]]
    chamfer(fillet2_edges, length=FILLET2_SIZE - 0.0001)  # a hair under: the kernel refuses the full size

    # Fillet3
    fillet3_edges = [part.edges().sort_by_distance(p)[0] for p in [
        (60.5, 6.35, -73.05),
        (6.5, 6.35, -73.05),
    ]]
    chamfer(fillet3_edges, length=FILLET3_SIZE)

    # Sketch20 → Boss-Extrude8 (add)
    with BuildSketch(Plane.XZ.offset(9.3)):
        with Locations(Location((23.4, -59.65, 0), (0, 0, 270))):
            Circle(SKETCH20_R)
    extrude(amount=BOSS_EXTRUDE8_DEPTH)

    # Fillet4
    fillet4_edges = [part.edges().sort_by_distance(p)[0] for p in [
        (23.4, -15.3, -55.679969081),
    ]]
    fillet(fillet4_edges, radius=FILLET4_R)

    # Cut-Extrude13 outline → Cut-Extrude13 (cut)
    with BuildSketch(Plane(origin=(0, 22, 0), x_dir=(1, 0, 0), z_dir=(0, 1, 0)).offset(CUT_EXTRUDE13_START)):
        Polygon((67, 50), (60.5, 56.5), (60.5, 72.55), (60, 73.05), (7, 73.05), (6.5, 72.55), (6.5, 56.5), (0, 50), align=None)
    extrude(amount=CUT_EXTRUDE13_DEPTH, mode=Mode.SUBTRACT)

    # Sketch22 → Cut-Extrude14 (cut)
    with BuildSketch(Plane(origin=(0, 0, -50), x_dir=(-1, 0, 0), z_dir=(0, 0, -1))):
        with Locations((-32.440964265, -5.906555379)):
            Rectangle(SKETCH22_W, SKETCH22_H)
    extrude(amount=-CUT_EXTRUDE14_DEPTH, mode=Mode.SUBTRACT)

    # Sketch23 → Boss-Extrude9 (add)
    with BuildSketch(Plane(origin=(0, 22, 0), x_dir=(1, 0, 0), z_dir=(0, 1, 0))):
        with Locations((33.5, 48)):
            Rectangle(SKETCH23_W, SKETCH23_H)
    extrude(amount=BOSS_EXTRUDE9_DEPTH)

    # Sketch24 → Boss-Extrude10 (add)
    with BuildSketch(Plane.XZ):
        with Locations((33.5, -48)):
            Rectangle(SKETCH24_W, SKETCH24_H)
    extrude(amount=BOSS_EXTRUDE10_DEPTH)

    # Sketch25 → Boss-Extrude11 (add)
    with BuildSketch(Plane(origin=(0, 0, -50), x_dir=(-1, 0, 0), z_dir=(0, 0, -1))):
        with Locations((-33.5, 11)):
            Rectangle(SKETCH25_W, SKETCH25_H)
    extrude(amount=BOSS_EXTRUDE11_DEPTH)

    # Fillet6
    fillet6_edges = [part.edges().sort_by_distance(p)[0] for p in [
        (63, 11, -46),
        (4, 11, -46),
    ]]
    chamfer(fillet6_edges, length=FILLET6_SIZE)

    # Sketch27 → Cut-Extrude16 (cut)
    with BuildSketch(Plane.XY.offset(-46)):
        with Locations((33.5, 24)):
            Rectangle(SKETCH27_W, SKETCH27_H)
        with Locations((33.5, -2)):
            Rectangle(SKETCH27_W, SKETCH27_H)
    extrude(amount=-CUT_EXTRUDE16_DEPTH, mode=Mode.SUBTRACT)

    # Fillet7
    fillet7_edges = [part.edges().sort_by_distance(p)[0] for p in [
        (39.5, 11, -50),
        (33.5, 5, -50),
        (27.5, 11, -50),
        (33.5, 17, -50),
    ]]
    chamfer(fillet7_edges, length=FILLET7_SIZE - 0.0001)  # a hair under: the kernel refuses the full size

    # Sketch29 → Cut-Extrude17 (cut)
    with BuildSketch(Plane.XZ.offset(-5)):
        with Locations(Location((33.5, -67.5, 0), (0, 0, 270))):
            Circle(SKETCH29_R)
        with Locations(Location((33.5, -80, 0), (0, 0, 270))):
            Circle(SKETCH29_R)
        with Locations(Location((33.5, -92.5, 0), (0, 0, 270))):
            Circle(SKETCH29_R)
        with Locations(Location((33.5, -105, 0), (0, 0, 270))):
            Circle(SKETCH29_R)
        with Locations(Location((33.5, -117.5, 0), (0, 0, 270))):
            Circle(SKETCH29_R)
    extrude(amount=-CUT_EXTRUDE17_DEPTH, mode=Mode.SUBTRACT)

    # Fillet8
    fillet8_edges = [part.edges().sort_by_distance(p)[0] for p in [
        (39.5, 17, -92.49995),
        (39.5, 5, -92.49995),
        (27.5, 5, -92.49995),
        (27.5, 17, -92.49995),
        (39.5, 11, -130),
        (33.5, 5, -130),
        (27.5, 11, -130),
        (33.5, 17, -130),
    ]]
    fillet(fillet8_edges, radius=FILLET8_R)

    # Fillet9
    fillet9_edges = [part.edges().sort_by_distance(p)[0] for p in [
        (41.926726695, 19.426726695, -52.573173305),
        (41.926726695, 2.573273305, -52.573173305),
        (25.073273305, 19.426726695, -52.573173305),
        (25.073273305, 2.573273305, -52.573173305),
    ]]
    fillet(fillet9_edges, radius=FILLET9_R)

    # Fillet10
    fillet10_edges = [part.edges().sort_by_distance(p)[0] for p in [
        (0, 11, -50),
        (67, 11, -50),
    ]]
    chamfer(fillet10_edges, length=FILLET10_SIZE)


solid = part.part
